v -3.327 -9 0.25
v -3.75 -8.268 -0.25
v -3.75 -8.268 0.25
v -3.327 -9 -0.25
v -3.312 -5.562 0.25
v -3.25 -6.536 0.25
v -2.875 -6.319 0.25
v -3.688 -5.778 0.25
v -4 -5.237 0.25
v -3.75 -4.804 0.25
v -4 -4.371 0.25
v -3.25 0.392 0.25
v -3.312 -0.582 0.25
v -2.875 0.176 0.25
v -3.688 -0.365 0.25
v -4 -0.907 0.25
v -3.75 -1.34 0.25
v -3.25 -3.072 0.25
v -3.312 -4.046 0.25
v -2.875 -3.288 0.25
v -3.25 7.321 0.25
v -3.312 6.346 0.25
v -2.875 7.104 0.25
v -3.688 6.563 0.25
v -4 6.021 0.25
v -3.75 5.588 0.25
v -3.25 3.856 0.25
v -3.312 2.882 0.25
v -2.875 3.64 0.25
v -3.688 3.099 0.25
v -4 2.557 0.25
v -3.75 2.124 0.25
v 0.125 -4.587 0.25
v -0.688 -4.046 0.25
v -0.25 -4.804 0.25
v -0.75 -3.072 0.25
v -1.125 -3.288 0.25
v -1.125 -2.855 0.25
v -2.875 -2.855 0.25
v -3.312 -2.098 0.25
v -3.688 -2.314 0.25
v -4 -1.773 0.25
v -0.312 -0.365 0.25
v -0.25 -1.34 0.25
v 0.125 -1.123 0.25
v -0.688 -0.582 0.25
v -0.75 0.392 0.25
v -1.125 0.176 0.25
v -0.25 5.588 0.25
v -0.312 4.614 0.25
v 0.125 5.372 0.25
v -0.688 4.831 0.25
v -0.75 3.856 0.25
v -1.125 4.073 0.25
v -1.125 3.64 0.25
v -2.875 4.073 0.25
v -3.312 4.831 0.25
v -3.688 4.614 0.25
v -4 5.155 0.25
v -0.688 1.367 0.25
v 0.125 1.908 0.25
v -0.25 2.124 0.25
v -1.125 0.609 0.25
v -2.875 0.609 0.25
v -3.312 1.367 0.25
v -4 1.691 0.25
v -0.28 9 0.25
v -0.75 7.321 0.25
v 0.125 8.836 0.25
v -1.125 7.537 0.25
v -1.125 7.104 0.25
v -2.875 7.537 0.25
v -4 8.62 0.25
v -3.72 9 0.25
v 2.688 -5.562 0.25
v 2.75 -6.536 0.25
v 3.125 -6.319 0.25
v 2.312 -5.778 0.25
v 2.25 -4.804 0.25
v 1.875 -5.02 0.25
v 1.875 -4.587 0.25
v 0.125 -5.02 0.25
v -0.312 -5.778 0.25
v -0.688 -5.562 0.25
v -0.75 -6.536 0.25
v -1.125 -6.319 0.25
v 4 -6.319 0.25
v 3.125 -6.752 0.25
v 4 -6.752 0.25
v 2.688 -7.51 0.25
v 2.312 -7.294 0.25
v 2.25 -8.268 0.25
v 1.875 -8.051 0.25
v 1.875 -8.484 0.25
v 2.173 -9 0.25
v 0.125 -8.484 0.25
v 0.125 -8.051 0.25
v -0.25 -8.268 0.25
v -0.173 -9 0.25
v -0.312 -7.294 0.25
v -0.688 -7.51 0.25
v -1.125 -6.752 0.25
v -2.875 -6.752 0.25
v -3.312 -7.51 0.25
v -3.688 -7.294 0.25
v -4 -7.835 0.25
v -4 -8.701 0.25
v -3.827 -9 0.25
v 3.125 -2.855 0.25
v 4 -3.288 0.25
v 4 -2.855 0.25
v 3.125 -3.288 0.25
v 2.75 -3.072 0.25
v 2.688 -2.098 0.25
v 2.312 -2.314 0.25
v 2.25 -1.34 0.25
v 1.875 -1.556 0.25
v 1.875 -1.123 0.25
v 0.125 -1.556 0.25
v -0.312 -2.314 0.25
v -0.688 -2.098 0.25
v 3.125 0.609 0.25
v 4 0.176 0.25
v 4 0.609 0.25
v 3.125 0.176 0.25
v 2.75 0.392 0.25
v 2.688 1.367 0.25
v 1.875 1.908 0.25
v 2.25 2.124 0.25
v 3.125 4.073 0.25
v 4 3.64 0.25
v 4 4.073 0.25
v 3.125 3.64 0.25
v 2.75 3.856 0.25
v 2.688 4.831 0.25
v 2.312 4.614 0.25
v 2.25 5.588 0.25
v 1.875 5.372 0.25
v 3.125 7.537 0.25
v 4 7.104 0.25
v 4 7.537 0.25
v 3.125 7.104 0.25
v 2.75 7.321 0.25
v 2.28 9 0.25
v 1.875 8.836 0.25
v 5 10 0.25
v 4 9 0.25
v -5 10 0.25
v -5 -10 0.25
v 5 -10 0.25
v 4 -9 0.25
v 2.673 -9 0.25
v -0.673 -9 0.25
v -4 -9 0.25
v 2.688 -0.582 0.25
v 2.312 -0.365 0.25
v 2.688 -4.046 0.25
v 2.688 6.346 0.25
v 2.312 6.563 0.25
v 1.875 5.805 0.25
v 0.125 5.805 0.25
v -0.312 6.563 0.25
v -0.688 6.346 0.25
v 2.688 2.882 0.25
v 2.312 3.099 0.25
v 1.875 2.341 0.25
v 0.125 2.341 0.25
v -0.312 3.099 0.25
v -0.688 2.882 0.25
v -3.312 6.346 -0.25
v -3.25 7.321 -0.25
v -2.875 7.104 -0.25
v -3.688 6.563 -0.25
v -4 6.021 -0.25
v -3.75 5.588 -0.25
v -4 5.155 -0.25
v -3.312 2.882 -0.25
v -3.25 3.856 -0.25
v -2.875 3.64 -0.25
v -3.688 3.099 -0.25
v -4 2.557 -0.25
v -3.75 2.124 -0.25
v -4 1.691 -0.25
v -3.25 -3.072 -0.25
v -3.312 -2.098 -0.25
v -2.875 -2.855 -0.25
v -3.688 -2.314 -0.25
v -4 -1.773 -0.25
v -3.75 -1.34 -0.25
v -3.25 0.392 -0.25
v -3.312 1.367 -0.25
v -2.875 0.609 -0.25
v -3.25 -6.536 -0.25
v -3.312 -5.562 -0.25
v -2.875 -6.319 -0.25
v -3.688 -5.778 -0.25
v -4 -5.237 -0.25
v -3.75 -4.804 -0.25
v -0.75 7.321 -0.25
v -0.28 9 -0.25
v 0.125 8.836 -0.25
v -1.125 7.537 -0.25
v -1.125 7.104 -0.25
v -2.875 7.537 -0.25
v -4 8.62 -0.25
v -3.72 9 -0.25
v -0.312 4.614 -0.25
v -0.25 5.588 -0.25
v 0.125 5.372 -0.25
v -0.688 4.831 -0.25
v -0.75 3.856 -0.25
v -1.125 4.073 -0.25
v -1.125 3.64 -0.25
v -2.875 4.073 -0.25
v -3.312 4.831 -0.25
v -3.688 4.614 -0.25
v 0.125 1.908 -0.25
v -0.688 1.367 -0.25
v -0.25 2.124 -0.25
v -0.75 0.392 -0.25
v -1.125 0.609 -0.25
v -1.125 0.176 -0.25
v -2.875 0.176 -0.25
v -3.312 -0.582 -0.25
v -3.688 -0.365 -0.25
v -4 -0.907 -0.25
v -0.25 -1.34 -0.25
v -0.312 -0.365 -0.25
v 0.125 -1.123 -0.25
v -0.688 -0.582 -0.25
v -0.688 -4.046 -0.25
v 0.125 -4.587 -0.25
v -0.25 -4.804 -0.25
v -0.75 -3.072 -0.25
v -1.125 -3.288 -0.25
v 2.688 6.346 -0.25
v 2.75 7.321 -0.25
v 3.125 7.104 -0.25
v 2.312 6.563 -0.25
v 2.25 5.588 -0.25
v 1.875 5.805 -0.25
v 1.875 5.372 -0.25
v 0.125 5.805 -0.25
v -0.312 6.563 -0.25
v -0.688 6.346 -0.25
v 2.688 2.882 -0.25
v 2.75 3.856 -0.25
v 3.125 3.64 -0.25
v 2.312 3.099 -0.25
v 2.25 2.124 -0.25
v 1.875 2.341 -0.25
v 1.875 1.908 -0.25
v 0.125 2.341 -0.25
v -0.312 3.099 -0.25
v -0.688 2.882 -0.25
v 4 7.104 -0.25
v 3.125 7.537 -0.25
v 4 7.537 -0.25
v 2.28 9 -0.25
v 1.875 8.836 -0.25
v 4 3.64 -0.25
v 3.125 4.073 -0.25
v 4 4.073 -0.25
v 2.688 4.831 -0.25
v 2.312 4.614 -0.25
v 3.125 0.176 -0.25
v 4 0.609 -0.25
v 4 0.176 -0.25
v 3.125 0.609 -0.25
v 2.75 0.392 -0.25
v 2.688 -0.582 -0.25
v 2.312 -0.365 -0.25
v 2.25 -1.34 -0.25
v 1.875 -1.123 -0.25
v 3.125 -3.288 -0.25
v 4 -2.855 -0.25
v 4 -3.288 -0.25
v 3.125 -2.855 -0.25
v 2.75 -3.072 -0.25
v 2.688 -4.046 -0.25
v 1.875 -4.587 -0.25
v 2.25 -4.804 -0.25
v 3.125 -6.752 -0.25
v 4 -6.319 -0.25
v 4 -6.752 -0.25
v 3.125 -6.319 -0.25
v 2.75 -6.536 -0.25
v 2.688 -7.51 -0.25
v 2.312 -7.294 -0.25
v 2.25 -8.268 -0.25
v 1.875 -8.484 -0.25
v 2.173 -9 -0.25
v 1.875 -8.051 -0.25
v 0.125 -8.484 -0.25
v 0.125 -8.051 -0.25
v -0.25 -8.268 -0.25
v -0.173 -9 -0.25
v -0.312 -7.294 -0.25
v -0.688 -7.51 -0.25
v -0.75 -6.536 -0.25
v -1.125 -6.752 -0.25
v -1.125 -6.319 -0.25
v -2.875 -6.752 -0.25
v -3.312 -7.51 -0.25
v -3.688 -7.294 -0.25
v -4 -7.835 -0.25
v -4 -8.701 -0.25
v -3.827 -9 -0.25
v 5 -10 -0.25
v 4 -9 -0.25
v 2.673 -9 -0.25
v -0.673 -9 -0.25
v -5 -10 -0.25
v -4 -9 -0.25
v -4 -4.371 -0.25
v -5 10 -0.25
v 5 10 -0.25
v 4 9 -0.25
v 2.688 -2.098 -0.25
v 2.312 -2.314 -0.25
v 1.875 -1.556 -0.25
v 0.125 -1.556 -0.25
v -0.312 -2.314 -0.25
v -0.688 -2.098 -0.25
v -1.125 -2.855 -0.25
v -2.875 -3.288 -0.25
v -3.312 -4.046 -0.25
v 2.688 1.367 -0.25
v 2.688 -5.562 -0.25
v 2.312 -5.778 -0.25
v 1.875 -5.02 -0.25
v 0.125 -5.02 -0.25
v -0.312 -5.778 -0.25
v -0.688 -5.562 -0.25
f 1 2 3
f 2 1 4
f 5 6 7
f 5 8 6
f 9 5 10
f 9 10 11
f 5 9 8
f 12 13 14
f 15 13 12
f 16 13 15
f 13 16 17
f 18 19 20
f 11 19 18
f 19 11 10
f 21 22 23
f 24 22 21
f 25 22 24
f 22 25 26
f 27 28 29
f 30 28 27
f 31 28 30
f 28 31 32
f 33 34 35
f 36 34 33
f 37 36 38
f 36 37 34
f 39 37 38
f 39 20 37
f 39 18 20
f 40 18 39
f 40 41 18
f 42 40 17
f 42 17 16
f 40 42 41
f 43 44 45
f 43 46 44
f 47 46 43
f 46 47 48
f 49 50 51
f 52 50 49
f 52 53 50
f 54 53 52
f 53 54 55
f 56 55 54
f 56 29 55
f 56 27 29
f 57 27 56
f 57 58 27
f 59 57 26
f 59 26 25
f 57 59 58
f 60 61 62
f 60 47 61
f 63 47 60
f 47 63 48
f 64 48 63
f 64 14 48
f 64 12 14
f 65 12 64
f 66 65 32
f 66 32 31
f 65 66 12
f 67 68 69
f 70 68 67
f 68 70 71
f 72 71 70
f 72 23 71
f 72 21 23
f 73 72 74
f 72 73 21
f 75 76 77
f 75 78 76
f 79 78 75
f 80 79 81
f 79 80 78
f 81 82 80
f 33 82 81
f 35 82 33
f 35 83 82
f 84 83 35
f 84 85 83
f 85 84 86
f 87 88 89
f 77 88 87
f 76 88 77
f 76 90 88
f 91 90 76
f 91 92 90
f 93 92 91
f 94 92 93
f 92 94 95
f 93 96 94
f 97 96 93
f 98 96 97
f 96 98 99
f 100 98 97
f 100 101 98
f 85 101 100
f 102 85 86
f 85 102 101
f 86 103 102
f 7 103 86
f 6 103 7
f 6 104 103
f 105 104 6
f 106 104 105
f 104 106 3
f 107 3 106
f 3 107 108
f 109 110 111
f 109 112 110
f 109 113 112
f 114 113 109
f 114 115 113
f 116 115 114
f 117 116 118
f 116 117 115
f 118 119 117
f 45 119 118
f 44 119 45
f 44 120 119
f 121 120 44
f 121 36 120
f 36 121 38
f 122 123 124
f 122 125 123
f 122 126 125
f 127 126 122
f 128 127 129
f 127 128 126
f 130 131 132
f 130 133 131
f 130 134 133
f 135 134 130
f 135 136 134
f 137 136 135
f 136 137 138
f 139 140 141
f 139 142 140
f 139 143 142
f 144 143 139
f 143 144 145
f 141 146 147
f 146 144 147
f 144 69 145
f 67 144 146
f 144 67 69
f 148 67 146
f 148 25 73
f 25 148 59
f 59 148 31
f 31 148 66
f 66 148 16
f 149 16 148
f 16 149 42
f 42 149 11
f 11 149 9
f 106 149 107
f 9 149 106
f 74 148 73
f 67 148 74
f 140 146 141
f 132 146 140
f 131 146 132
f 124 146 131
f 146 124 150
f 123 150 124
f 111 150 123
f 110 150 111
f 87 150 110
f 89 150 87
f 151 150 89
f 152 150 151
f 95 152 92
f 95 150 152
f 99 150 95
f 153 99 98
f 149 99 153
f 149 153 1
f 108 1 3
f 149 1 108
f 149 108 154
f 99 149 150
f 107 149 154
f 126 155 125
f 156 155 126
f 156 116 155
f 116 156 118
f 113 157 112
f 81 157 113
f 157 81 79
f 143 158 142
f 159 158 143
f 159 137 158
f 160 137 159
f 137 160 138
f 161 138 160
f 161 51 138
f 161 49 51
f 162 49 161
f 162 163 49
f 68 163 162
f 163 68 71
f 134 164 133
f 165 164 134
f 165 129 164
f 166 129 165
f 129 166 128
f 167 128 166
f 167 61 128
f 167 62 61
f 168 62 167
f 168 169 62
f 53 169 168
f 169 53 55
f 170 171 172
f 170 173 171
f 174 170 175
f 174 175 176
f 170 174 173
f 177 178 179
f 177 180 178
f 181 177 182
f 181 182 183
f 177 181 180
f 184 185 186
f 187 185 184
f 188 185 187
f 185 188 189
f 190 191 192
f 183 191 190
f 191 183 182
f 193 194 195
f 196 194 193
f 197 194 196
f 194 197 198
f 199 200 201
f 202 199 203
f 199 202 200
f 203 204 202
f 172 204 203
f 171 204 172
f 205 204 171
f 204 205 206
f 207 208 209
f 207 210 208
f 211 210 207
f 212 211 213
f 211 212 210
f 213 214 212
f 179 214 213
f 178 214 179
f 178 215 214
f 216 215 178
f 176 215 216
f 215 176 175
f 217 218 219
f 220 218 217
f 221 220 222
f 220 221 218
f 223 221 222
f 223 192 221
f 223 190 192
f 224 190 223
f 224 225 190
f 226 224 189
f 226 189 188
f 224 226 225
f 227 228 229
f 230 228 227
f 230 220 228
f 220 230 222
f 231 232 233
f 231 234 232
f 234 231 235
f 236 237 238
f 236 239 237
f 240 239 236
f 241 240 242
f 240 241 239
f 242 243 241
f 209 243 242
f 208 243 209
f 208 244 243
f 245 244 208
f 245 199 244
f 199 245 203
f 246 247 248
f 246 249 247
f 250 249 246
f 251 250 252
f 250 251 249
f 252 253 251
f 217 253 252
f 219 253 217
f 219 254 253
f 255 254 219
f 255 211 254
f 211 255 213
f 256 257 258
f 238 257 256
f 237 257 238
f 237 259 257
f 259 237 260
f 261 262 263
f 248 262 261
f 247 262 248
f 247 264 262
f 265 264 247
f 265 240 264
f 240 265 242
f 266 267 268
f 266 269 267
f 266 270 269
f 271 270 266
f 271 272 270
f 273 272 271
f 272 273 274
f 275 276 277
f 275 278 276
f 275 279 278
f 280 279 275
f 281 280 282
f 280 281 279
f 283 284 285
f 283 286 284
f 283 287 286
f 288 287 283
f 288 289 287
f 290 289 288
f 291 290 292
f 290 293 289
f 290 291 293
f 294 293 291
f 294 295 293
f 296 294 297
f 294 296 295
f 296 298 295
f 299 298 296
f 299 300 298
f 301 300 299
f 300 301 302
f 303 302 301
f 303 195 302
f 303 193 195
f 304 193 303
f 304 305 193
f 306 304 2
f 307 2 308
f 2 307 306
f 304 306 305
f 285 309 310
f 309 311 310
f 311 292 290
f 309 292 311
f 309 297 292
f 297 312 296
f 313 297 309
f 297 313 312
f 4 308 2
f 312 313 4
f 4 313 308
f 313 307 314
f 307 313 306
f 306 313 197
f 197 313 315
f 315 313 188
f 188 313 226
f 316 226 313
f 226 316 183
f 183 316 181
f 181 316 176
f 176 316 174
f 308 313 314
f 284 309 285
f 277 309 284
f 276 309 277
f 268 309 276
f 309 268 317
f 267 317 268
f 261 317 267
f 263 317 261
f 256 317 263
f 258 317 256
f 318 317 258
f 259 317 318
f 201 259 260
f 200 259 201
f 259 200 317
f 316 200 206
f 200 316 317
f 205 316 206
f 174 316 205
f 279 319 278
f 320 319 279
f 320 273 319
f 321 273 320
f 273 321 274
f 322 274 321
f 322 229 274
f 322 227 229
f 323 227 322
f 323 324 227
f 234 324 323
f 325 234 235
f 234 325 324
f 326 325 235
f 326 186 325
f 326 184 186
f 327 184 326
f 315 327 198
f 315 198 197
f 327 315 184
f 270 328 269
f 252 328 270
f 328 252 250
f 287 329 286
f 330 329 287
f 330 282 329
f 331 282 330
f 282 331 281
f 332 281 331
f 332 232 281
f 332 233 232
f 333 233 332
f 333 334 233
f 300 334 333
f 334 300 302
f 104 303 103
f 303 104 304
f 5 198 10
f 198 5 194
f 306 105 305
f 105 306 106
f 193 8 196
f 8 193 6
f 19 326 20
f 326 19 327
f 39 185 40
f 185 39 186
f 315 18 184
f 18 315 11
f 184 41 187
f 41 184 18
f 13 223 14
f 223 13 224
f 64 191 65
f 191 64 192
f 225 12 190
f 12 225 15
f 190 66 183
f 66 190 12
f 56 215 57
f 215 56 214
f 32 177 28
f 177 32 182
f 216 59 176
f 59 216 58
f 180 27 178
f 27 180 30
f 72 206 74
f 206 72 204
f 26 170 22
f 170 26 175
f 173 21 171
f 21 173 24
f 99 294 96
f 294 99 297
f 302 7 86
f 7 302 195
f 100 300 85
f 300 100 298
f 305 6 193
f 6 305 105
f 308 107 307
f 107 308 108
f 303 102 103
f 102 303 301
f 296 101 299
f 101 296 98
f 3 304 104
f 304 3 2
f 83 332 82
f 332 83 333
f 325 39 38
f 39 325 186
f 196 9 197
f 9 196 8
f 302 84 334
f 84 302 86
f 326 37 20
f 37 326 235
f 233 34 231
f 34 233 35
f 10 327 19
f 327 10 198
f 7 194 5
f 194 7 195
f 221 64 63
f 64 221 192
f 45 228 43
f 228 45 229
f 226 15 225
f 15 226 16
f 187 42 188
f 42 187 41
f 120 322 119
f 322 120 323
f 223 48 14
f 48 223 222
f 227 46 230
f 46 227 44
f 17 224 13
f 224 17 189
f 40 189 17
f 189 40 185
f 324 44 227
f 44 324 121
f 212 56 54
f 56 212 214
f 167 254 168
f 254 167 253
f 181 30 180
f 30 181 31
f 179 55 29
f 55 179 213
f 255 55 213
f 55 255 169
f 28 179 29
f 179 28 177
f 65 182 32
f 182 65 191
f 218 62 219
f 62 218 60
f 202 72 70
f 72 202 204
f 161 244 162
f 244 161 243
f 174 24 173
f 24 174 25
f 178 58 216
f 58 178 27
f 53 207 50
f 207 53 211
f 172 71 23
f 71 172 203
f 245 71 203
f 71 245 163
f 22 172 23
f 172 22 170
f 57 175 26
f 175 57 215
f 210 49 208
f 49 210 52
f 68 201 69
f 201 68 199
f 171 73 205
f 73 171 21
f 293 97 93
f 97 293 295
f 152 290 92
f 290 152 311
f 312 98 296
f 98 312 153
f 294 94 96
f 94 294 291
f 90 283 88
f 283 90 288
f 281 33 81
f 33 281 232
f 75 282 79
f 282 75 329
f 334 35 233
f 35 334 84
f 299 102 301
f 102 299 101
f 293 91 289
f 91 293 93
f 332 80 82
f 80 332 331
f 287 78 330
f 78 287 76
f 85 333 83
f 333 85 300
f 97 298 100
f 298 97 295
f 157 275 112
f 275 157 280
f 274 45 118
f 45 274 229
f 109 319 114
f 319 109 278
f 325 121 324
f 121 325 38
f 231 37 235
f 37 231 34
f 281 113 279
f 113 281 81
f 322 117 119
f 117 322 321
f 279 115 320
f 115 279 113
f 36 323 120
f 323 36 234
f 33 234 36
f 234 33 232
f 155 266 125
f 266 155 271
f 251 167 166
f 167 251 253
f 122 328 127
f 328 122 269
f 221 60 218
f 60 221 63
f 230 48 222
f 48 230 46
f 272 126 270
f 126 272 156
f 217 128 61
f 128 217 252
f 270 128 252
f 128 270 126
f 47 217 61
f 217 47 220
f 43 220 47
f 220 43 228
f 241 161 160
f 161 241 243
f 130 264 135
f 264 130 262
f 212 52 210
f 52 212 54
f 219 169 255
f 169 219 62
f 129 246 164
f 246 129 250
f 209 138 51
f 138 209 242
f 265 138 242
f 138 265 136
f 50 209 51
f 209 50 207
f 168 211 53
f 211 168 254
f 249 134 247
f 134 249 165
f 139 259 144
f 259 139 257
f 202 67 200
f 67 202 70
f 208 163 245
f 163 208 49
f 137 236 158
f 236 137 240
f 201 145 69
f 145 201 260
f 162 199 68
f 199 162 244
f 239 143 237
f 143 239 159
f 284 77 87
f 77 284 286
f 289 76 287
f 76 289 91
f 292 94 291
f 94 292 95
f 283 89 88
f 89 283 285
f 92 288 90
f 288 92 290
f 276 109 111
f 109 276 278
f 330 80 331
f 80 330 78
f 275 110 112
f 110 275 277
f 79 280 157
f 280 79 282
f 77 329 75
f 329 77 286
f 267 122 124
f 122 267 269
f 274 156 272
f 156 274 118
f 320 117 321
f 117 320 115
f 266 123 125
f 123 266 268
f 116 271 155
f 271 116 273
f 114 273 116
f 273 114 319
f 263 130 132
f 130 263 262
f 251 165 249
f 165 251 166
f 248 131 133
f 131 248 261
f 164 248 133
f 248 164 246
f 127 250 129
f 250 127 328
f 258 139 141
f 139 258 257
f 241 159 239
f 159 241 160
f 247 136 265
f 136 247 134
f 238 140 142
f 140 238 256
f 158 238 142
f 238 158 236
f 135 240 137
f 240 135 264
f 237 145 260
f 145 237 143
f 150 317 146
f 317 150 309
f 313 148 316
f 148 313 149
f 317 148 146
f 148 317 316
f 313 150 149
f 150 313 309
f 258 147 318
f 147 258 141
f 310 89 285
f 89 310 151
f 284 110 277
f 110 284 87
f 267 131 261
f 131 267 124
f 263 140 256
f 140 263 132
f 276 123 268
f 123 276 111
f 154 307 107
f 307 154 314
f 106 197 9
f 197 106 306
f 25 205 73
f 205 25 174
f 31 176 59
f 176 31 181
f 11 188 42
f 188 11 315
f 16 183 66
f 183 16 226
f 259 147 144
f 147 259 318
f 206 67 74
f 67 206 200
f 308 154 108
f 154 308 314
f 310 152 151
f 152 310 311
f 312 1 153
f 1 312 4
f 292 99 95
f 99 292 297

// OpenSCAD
// Customizable hex pattern
// Created by Kjell Kernen
// Date 22.9.2014

/*[Pattern Parameters]*/
// of the pattern in mm:
width=10;       // [10:100]

// of the pattern in mm:
lenght=20;      // [10:100]

// of the pattern in tens of mm:
height=5;       // [2:200]

// in tens of mm:
border_width=20;// [2:100]

// in mm:
hex_radius=2;   // [1:20]

// in tens of mm: 
hex_border_width=5; // [2:50]

/*[Hidden]*/

xborder=(border_width/10<width)?width-border_width/10:0;
yborder=(border_width/10<lenght)?lenght-border_width/10:0;

x=sqrt(3/4*hex_radius*hex_radius);
ystep=2*x;
xstep=3*hex_radius/2;

module hex(x,y)
{
	difference()
	{
		translate([x,y,-height/20]) 
			cylinder(r=(hex_radius+hex_border_width/20), h=height/10, $fn=6);	
		translate([x,y,-height/20]) 
			cylinder(r=(hex_radius-hex_border_width/20), h=height/10, $fn=6);
	}
}

//Pattern
intersection()
{
	for (xi=[0:xstep:width])
		for(yi=[0:ystep:lenght])
			hex(xi-width/2,((((xi/xstep)%2)==0)?0:ystep/2)+yi-lenght/2);
	translate([-width/2, -lenght/2, -height/20]) 
		cube([width,lenght,height/10]);
}

// Frame
difference()
{
	translate([-width/2, -lenght/2, -height/20]) 
		cube([width,lenght,height/10]);
	translate([-xborder/2, -yborder/2, -(height/20+0.1)]) 
		cube([xborder,yborder,height/10+0.2]); 
}



